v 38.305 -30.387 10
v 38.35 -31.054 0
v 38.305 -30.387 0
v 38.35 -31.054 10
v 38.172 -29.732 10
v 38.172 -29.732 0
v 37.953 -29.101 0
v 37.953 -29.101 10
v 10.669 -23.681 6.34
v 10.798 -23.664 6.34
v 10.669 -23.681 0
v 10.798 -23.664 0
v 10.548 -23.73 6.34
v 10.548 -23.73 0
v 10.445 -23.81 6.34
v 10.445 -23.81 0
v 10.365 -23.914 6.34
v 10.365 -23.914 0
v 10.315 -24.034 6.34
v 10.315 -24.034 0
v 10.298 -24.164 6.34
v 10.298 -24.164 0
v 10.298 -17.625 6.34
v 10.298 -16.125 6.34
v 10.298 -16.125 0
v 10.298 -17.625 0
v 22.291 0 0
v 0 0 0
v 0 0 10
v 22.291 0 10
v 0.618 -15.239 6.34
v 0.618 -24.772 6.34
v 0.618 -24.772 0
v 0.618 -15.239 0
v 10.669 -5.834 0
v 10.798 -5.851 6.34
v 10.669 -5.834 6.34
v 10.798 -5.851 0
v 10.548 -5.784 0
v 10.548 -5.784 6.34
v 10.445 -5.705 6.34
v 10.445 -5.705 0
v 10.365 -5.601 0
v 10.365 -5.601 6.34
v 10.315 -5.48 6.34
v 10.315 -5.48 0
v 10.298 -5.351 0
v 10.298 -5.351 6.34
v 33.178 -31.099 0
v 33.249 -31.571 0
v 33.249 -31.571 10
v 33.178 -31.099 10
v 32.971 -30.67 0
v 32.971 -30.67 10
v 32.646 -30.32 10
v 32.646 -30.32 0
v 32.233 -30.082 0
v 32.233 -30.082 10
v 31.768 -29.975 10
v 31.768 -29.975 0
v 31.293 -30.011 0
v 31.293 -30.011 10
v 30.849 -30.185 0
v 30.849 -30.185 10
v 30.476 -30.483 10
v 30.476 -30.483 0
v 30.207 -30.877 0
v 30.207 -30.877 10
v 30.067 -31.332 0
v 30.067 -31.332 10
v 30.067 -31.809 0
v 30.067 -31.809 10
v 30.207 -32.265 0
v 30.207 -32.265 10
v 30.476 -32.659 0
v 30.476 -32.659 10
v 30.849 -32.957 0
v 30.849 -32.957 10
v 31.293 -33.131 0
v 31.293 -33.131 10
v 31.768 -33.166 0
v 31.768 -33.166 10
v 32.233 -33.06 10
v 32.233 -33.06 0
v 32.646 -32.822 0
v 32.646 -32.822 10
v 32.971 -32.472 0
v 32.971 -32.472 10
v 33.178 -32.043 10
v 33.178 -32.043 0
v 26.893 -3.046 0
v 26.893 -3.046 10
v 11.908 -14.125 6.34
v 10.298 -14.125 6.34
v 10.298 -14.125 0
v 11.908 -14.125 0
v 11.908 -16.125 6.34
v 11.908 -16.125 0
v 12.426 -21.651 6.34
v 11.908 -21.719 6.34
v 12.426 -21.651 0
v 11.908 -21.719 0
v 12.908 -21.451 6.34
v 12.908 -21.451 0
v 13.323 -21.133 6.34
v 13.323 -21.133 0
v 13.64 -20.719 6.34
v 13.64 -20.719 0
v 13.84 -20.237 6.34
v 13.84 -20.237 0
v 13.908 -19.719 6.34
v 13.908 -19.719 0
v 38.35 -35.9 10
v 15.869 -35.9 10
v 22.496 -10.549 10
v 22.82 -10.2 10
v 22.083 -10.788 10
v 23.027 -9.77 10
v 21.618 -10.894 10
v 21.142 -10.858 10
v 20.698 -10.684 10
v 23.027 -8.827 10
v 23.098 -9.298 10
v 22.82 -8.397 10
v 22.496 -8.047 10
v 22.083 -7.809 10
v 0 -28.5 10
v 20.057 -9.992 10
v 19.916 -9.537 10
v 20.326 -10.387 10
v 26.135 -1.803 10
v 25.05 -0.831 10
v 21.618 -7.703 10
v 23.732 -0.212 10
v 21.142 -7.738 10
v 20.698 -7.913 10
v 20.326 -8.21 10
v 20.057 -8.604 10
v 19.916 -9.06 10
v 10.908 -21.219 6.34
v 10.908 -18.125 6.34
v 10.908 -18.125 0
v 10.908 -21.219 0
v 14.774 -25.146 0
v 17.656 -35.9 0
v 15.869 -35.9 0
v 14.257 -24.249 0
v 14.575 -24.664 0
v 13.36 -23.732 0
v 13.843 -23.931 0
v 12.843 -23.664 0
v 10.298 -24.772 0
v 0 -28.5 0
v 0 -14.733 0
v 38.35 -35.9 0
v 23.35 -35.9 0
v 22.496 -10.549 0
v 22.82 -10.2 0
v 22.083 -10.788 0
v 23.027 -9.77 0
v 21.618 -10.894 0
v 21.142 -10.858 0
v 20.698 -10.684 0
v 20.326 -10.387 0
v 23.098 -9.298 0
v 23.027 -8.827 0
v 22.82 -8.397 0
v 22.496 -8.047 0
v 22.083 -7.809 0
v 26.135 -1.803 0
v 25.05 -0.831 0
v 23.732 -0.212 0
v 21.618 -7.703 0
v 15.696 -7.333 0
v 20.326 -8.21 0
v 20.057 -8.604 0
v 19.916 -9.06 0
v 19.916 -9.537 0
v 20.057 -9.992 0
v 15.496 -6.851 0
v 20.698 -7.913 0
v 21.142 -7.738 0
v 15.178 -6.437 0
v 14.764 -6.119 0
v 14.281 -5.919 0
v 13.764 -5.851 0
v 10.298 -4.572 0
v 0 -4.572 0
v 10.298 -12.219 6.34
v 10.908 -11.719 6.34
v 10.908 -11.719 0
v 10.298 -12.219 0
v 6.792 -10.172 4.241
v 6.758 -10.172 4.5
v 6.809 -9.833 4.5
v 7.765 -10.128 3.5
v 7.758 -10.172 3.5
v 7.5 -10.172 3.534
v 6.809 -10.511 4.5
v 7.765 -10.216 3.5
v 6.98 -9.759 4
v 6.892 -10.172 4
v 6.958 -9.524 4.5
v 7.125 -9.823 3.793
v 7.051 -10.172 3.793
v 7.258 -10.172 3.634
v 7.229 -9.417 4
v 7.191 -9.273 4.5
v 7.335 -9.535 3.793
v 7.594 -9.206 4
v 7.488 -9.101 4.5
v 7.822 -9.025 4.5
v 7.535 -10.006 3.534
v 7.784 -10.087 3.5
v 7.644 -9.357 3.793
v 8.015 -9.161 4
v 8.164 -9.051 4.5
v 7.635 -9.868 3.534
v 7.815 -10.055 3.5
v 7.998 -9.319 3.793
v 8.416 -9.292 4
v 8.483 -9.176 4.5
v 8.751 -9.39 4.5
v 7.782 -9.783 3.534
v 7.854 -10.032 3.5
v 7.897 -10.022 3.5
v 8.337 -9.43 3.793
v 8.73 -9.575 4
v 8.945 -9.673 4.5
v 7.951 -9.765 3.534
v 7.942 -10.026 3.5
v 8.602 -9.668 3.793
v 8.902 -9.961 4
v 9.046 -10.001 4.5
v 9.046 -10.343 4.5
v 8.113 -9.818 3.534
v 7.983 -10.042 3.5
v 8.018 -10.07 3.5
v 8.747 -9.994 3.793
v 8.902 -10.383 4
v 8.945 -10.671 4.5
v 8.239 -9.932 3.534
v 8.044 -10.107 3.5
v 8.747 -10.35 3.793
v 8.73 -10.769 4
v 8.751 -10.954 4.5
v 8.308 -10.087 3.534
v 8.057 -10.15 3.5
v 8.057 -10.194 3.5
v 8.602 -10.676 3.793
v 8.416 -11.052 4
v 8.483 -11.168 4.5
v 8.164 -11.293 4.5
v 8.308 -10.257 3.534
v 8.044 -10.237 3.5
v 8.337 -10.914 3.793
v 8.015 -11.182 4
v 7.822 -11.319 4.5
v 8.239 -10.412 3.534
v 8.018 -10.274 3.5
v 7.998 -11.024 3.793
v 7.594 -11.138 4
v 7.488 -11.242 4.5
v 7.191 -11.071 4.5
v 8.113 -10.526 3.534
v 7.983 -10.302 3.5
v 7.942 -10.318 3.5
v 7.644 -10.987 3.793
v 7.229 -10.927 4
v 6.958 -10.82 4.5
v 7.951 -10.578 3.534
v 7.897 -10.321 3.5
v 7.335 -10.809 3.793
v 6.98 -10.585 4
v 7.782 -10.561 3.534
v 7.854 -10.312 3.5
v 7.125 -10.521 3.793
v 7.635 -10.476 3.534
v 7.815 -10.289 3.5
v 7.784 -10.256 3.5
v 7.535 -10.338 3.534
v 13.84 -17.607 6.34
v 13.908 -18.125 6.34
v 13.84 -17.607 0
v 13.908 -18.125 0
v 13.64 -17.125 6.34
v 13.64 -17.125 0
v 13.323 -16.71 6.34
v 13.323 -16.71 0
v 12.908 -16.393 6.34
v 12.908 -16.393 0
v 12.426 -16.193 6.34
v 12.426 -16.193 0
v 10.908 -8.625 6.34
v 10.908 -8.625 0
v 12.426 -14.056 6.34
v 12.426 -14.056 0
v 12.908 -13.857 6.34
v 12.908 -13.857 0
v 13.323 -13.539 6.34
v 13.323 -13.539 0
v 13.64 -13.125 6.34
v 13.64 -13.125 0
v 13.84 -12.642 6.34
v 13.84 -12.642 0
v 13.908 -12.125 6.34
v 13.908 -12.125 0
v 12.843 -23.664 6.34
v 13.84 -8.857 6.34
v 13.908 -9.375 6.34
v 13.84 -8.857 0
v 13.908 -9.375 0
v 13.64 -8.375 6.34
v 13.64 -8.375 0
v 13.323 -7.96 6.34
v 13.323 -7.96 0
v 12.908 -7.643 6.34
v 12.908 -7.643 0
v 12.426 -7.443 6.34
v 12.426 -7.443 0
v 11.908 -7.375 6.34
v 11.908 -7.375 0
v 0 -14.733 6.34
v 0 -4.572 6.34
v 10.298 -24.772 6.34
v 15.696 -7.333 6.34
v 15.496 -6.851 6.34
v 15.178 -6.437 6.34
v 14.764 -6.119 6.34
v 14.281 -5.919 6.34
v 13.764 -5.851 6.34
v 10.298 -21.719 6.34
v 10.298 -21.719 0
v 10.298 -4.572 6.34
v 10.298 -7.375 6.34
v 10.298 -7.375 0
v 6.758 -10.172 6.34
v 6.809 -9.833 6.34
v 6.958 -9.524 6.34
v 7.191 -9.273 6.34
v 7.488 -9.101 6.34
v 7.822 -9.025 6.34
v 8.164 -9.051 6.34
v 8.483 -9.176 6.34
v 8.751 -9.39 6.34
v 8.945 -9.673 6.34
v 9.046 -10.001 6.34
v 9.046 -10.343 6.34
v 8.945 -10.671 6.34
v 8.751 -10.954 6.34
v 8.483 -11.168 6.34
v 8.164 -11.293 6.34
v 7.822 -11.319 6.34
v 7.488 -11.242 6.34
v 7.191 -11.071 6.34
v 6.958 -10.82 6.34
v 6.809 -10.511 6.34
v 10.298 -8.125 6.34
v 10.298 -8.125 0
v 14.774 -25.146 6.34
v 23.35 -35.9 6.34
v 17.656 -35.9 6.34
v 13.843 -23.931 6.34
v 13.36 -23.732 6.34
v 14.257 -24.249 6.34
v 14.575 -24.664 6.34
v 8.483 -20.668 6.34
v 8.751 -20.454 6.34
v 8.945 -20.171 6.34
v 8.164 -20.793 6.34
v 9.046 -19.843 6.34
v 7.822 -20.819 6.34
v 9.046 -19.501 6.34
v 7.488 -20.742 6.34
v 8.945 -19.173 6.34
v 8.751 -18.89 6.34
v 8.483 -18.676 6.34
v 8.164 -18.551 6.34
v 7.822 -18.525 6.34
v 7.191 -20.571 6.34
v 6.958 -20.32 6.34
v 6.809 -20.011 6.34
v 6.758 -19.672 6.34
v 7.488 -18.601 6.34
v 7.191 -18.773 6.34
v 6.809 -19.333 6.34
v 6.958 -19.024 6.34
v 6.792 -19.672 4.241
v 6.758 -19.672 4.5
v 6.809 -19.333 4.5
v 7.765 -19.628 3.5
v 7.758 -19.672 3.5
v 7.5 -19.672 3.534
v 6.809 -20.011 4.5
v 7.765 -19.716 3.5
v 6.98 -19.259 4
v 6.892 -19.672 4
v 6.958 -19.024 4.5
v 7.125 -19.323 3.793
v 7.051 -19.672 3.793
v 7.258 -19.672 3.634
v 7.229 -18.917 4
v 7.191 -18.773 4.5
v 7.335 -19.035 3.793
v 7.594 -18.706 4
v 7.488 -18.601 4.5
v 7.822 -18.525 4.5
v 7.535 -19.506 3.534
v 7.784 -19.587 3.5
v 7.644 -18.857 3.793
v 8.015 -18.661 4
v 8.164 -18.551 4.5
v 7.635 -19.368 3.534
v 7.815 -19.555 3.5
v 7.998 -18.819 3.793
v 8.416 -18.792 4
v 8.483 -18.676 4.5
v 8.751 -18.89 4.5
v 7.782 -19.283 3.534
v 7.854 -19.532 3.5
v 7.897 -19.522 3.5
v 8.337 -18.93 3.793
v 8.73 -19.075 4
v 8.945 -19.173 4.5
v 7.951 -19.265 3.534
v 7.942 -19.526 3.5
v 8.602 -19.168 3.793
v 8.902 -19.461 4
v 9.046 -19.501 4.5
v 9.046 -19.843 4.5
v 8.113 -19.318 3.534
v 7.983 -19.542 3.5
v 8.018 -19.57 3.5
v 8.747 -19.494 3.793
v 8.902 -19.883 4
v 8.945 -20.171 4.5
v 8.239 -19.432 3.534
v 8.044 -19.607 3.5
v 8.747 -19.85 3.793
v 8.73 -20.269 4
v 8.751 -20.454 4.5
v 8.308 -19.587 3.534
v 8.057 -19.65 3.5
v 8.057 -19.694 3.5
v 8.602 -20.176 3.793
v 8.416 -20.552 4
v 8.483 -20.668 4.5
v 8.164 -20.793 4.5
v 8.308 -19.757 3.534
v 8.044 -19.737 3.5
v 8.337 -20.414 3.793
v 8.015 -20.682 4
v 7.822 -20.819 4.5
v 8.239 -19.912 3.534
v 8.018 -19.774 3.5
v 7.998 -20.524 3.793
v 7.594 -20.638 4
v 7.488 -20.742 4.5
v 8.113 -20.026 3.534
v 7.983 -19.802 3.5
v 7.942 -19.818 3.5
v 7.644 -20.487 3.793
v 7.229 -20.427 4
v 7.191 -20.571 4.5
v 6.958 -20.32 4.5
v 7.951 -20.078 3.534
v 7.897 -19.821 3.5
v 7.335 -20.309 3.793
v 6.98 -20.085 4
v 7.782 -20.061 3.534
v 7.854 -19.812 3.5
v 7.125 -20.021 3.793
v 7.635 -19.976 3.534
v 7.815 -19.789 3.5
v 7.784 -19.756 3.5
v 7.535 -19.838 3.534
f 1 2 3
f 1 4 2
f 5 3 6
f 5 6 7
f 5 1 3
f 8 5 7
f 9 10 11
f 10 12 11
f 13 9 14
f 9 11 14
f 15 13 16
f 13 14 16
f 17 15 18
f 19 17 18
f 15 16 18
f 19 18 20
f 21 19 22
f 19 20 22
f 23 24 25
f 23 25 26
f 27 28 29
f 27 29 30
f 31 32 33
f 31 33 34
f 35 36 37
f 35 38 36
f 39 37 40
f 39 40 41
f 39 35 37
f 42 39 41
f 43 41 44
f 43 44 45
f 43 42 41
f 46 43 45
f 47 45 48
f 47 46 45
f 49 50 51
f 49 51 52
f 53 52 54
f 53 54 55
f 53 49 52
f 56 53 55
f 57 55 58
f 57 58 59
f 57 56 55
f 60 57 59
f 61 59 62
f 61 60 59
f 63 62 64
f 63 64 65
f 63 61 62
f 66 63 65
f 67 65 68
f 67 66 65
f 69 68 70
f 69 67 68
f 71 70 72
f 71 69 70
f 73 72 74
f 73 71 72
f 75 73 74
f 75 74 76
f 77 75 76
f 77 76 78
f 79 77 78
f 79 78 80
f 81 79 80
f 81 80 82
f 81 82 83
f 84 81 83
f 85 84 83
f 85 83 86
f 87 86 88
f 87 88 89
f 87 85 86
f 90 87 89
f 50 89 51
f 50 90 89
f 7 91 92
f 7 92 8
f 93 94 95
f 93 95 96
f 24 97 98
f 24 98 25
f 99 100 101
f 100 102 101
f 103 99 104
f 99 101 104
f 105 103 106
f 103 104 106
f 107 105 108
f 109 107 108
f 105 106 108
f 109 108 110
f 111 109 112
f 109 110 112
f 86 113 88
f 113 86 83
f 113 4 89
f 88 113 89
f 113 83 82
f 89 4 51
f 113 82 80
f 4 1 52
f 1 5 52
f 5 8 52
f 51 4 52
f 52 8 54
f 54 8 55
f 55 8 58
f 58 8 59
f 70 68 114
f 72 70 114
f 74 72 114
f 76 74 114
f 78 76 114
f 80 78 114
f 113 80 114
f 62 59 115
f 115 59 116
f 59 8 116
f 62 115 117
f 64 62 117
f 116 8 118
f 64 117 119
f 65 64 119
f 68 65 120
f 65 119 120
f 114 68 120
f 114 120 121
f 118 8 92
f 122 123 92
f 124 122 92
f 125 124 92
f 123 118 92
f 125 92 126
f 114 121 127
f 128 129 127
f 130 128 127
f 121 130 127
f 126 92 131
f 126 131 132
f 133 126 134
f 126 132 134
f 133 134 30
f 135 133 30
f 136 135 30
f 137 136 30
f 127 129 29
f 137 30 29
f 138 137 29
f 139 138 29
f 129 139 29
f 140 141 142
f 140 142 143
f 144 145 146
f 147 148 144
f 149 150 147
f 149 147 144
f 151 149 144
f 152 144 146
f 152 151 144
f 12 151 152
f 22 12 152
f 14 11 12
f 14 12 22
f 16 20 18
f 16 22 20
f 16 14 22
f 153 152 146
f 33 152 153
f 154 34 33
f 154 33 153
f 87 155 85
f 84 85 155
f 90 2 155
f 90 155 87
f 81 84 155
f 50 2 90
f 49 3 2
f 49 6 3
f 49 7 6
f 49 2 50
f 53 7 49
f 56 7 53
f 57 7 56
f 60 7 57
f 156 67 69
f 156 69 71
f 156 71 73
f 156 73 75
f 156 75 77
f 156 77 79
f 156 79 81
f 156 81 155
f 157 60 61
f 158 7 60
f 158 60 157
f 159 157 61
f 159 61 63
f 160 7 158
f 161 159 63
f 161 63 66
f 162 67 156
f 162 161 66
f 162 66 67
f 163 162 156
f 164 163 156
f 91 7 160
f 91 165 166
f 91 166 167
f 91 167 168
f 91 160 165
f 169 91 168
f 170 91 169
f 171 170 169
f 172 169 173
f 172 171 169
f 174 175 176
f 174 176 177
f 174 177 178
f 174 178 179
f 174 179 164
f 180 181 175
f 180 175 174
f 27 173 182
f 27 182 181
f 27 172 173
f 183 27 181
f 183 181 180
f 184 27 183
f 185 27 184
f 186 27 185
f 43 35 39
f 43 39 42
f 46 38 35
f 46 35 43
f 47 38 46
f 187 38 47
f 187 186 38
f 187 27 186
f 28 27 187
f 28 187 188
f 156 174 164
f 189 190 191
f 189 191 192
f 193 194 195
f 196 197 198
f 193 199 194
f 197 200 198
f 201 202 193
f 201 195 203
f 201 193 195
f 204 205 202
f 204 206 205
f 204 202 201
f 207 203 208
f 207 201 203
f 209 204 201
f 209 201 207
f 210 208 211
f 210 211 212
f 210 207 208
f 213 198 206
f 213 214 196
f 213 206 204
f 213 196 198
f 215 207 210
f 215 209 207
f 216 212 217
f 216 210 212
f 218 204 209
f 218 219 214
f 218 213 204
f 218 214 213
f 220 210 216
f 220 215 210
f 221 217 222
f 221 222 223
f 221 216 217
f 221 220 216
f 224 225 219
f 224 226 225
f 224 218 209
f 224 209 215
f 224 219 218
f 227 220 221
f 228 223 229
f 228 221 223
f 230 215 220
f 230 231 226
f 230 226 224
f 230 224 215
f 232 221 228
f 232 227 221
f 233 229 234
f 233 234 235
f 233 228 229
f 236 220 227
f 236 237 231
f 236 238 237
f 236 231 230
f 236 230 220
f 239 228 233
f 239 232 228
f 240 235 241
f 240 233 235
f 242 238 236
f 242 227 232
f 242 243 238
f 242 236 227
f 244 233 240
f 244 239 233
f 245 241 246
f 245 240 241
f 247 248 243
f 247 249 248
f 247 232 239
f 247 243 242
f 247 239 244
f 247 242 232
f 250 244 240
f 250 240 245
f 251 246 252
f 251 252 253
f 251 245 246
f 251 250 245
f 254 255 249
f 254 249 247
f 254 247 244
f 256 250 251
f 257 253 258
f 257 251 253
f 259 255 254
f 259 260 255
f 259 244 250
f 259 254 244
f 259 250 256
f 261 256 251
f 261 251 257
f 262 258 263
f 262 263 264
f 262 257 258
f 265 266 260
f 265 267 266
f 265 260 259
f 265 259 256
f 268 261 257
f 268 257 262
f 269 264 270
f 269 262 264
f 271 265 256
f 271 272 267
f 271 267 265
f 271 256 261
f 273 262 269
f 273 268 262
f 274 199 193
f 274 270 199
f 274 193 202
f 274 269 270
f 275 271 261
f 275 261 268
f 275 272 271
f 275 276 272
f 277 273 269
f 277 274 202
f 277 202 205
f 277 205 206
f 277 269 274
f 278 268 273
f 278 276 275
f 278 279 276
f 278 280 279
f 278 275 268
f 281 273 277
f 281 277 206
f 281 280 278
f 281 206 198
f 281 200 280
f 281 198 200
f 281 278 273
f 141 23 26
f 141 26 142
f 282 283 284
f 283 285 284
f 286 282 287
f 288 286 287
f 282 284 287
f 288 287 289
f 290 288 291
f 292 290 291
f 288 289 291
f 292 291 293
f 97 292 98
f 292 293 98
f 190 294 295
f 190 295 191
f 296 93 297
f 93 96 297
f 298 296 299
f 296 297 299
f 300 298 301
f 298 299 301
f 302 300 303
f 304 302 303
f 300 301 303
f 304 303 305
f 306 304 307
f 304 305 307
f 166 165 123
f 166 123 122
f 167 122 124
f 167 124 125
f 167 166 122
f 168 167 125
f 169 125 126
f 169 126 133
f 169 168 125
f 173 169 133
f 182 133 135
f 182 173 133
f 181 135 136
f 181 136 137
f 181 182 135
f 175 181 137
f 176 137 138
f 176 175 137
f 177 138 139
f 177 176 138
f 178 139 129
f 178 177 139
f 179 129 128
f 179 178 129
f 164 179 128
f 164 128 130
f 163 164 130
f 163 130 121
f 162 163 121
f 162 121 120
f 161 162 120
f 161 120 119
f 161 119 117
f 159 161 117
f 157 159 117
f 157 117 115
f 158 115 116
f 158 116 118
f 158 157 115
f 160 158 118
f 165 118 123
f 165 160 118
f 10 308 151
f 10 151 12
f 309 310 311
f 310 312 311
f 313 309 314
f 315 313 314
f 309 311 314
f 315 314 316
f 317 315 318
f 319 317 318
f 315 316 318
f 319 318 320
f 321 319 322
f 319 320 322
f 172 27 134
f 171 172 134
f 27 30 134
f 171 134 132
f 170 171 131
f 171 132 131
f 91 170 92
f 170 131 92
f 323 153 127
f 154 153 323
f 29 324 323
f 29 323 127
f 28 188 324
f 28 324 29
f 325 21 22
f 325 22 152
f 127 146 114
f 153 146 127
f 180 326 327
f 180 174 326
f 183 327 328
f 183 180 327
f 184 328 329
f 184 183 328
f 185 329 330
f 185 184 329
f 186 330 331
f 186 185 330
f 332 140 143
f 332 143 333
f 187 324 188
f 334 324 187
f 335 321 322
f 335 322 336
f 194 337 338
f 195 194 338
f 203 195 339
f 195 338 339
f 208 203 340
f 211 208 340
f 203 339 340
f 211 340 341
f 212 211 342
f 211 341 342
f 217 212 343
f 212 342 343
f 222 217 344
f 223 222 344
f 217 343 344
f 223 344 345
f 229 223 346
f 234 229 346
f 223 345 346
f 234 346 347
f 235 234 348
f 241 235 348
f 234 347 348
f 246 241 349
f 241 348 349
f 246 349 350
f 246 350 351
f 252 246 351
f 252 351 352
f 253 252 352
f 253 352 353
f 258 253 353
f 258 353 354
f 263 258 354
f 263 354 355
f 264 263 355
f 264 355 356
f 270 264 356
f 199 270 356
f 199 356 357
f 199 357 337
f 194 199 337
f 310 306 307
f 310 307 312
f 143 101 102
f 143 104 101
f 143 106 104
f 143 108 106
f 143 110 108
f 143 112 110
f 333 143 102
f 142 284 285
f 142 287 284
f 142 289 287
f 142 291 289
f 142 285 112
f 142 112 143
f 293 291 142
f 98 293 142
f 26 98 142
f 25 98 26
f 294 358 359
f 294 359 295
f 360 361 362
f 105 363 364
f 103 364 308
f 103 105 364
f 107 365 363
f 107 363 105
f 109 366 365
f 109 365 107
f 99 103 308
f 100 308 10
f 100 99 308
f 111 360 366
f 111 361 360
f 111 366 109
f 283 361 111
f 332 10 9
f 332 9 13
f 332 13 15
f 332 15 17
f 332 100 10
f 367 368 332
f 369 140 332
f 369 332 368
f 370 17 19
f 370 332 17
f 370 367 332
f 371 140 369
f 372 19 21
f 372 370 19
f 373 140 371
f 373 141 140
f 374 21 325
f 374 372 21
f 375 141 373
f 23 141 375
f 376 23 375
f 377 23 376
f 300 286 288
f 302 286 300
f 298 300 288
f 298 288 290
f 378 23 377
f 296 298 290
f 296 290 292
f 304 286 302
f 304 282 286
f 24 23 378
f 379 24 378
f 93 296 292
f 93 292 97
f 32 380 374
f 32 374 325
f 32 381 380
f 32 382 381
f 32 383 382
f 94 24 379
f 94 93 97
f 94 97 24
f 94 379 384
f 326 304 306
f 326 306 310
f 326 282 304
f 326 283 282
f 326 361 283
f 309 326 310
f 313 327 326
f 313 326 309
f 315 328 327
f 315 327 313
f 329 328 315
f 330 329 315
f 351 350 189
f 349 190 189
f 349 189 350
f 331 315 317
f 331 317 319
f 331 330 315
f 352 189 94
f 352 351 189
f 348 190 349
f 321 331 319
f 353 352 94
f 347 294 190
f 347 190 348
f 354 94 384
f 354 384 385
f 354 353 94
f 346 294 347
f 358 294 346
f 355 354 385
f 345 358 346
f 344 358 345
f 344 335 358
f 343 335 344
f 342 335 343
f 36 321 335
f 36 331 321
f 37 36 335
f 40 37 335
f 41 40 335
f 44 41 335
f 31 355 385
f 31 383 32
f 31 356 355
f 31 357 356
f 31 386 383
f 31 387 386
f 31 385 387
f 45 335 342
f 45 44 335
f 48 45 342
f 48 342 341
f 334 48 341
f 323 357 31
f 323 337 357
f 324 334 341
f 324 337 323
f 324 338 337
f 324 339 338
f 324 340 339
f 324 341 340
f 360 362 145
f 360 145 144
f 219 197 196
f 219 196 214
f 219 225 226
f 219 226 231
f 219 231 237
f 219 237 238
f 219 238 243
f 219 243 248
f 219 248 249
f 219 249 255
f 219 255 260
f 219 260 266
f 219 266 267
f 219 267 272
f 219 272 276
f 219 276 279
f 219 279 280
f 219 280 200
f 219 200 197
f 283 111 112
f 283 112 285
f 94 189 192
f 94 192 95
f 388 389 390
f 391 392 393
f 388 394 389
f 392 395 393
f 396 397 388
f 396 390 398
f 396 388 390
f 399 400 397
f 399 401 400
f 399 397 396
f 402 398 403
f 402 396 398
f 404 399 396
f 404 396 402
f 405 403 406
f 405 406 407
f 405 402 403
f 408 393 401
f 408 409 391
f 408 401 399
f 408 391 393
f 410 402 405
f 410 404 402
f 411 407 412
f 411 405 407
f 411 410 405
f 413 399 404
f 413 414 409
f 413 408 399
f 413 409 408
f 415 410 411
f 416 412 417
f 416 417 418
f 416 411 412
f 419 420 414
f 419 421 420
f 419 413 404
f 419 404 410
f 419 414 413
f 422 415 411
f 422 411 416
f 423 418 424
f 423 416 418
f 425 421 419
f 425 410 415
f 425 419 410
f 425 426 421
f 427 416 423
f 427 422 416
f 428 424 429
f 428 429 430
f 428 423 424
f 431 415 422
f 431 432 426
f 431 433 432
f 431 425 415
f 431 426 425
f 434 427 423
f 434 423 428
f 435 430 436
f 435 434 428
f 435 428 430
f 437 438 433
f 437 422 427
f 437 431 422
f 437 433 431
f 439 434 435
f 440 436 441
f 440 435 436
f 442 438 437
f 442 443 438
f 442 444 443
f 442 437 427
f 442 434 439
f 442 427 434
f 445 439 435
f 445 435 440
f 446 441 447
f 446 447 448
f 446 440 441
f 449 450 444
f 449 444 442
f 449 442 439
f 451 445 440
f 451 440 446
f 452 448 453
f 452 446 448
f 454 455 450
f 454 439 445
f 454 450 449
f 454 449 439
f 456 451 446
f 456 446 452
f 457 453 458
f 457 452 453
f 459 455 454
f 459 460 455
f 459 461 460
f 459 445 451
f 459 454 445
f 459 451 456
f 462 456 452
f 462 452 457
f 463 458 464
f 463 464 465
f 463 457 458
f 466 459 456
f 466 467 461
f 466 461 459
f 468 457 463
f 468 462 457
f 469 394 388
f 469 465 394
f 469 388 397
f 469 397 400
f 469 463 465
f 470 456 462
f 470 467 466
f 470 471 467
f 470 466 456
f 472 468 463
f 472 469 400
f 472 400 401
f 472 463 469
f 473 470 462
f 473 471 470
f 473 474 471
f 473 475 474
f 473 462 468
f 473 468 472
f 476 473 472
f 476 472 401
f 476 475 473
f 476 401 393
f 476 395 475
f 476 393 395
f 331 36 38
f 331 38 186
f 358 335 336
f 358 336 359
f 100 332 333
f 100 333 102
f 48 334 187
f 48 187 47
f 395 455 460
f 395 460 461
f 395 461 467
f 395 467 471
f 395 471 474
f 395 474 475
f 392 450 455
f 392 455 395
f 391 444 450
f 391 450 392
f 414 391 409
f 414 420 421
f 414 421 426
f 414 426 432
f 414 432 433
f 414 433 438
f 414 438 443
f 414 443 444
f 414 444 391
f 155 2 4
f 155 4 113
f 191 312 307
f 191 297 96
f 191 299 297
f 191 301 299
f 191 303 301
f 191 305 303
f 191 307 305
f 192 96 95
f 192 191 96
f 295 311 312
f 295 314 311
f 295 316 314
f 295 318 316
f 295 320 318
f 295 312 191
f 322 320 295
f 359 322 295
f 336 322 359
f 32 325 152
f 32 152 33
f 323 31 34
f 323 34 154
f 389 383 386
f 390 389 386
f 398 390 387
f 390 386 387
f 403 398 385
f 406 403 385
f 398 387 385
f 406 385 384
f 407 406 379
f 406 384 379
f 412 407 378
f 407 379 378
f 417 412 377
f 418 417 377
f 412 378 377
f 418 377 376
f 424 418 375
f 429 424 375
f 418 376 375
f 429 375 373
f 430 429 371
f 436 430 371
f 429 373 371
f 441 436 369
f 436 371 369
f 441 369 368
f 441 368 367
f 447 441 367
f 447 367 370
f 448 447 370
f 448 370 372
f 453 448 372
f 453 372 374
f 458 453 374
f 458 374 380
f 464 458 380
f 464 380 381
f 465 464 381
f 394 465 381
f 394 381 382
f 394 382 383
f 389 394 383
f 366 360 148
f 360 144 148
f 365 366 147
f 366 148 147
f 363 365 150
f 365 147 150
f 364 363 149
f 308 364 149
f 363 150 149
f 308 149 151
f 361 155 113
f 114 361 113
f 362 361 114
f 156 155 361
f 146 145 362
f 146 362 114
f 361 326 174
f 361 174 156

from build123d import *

# Parameters (mm, degrees)
SKETCH1_R           = 1.6
BOSS_EXTRUDE1_DEPTH = 10
CAVITY1_OUTLINE_R   = 1.25
CAVITY1_DEPTH       = 6.34
CAVITY1_START       = -22.606898648
CAVITY1_2_OUTLINE_R = 0.9
CAVITY1_2_DEPTH     = 0.47
CAVITY1_START_2     = -15.306898648
CAVITY1_3_OUTLINE_R = 0.9
CAVITY1_3_DEPTH     = 0.47
CAVITY1_START_3     = -6.506898648
CAVITY1_4_OUTLINE_R = 0.9
CAVITY1_4_DEPTH     = 0.47
CUT_EXTRUDE2_REACH  = 54.912
SKETCH2_R           = 1.15
CUT_EXTRUDE3_START  = -3.5
SKETCH3_R           = 1.15
CUT_EXTRUDE3_DEPTH  = 3.5
FILLET1_R           = 1
FILLET2_R           = 5
CUT_EXTRUDE4_START  = -6.34
CUT_EXTRUDE4_DEPTH  = 6.34
FILLET3_R           = 2
FILLET4_R           = 2
FILLET5_R           = 0.5


with BuildPart() as part:
    # Sketch1 → Boss-Extrude1 (new body)
    with BuildSketch(Plane.XY):
        Polygon((0, 0), (25.6, 0), (38.35, -30.037117664), (38.35, -35.9), (15.869351212, -35.9), (0, -28.5), align=None)
        with Locations((31.648794461, -31.570900751)):
            Circle(SKETCH1_R, mode=Mode.SUBTRACT)
        with Locations((21.498394042, -9.298229799)):
            Circle(SKETCH1_R, mode=Mode.SUBTRACT)
    extrude(amount=BOSS_EXTRUDE1_DEPTH)

    # Cavity1: read off the stored shape, not the designer's step
    # Cavity1 outline → Cavity1 (cut)
    with BuildSketch(Plane.XY):
        Polygon((10.198394042, -24.671898648), (10.198394042, -21.671898648), (10.808394042, -21.171898648), (10.808394042, -18.171898648), (10.198394042, -17.671898648), (10.198394042, -12.171898648), (10.808394042, -11.671898648), (10.808394042, -8.671898648), (10.198394042, -8.171898648), (10.198394042, -4.671898648), (0, -4.671898648), (0, -14.603899938), (0.718394042, -15.191898648), (0.718394042, -24.671898648), align=None)
        with Locations((7.908394042, -19.671898648)):
            Circle(CAVITY1_OUTLINE_R, mode=Mode.SUBTRACT)
        with Locations((7.908394042, -10.171898648)):
            Circle(CAVITY1_OUTLINE_R, mode=Mode.SUBTRACT)
    extrude(amount=CAVITY1_DEPTH, mode=Mode.SUBTRACT)

    # Cavity1 2 outline → Cavity1 2 (cut)
    with BuildSketch(Plane(origin=(0, 0, 0), x_dir=(1, 0, 0), z_dir=(0, 1, 0)).offset(CAVITY1_START)):
        Polygon((13.478394042, -4.73), (14.198394042, -4.01), (14.198394042, -2.33), (13.478394042, -1.61), (10.198394042, -1.61), (10.198394042, -4.73), align=None)
        with Locations((12.398394042, -3.17)):
            Circle(CAVITY1_2_OUTLINE_R, mode=Mode.SUBTRACT)
    extrude(amount=CAVITY1_2_DEPTH, mode=Mode.SUBTRACT)

    # Cavity1 3 outline → Cavity1 3 (cut)
    with BuildSketch(Plane(origin=(0, 0, 0), x_dir=(1, 0, 0), z_dir=(0, 1, 0)).offset(CAVITY1_START_2)):
        Polygon((13.478394042, -4.73), (14.198394042, -4.01), (14.198394042, -2.33), (13.478394042, -1.61), (10.198394042, -1.61), (10.198394042, -4.73), align=None)
        with Locations((12.398394042, -3.17)):
            Circle(CAVITY1_3_OUTLINE_R, mode=Mode.SUBTRACT)
    extrude(amount=CAVITY1_3_DEPTH, mode=Mode.SUBTRACT)

    # Cavity1 4 outline → Cavity1 4 (cut)
    with BuildSketch(Plane(origin=(0, 0, 0), x_dir=(1, 0, 0), z_dir=(0, 1, 0)).offset(CAVITY1_START_3)):
        Polygon((13.478394042, -4.73), (14.198394042, -4.01), (14.198394042, -2.33), (13.478394042, -1.61), (10.198394042, -1.61), (10.198394042, -4.73), align=None)
        with Locations((12.398394042, -3.17)):
            Circle(CAVITY1_4_OUTLINE_R, mode=Mode.SUBTRACT)
    extrude(amount=CAVITY1_4_DEPTH, mode=Mode.SUBTRACT)

    # Cut-Extrude2: up to this face of the body (flat: up to its plane)
    cut_extrude2_end = Plane(part.part.faces().sort_by_distance((19.850612991, -19.341556746, 0))[0])
    # Sketch2 → Cut-Extrude2 (cut, up to the picked face)
    with BuildSketch(Plane(origin=(0, 0, 6.34), x_dir=(-1, 0, 0), z_dir=(0, 0, -1)), mode=Mode.PRIVATE) as cut_extrude2_sk1:
        Polygon((-10.908394042, -21.219231953), (-10.298394042, -21.719231953), (-10.298394042, -24.771898648), (-0.618394042, -24.771898648), (-0.618394042, -15.239275241), (0.1, -14.651276531), (0.1, -4.571898648), (-10.298394042, -4.571898648), (-10.298394042, -8.124565343), (-10.908394042, -8.624565343), (-10.908394042, -11.719231953), (-10.298394042, -12.219231953), (-10.298394042, -17.624565343), (-10.908394042, -18.124565343), align=None)
        with Locations((-7.908394042, -10.171898648)):
            Circle(SKETCH2_R, mode=Mode.SUBTRACT)
        with Locations((-7.908394042, -19.671898648)):
            Circle(SKETCH2_R, mode=Mode.SUBTRACT)
    cut_extrude2_tool1 = split(extrude(cut_extrude2_sk1.sketch, amount=CUT_EXTRUDE2_REACH, mode=Mode.PRIVATE), bisect_by=cut_extrude2_end, keep=Keep.BOTH, mode=Mode.PRIVATE)
    add(cut_extrude2_tool1.solids().sort_by(Axis((5.274649, -14.483088, 6.34), (0, 0, -1)))[0], mode=Mode.SUBTRACT)

    # Sketch3 → Cut-Extrude3 (cut)
    with BuildSketch(Plane(origin=(0, 0, 0), x_dir=(-1, 0, 0), z_dir=(0, 0, -1)).offset(CUT_EXTRUDE3_START)):
        with Locations((-7.908394042, -10.171898648)):
            Circle(SKETCH3_R)
        with Locations((-7.908394042, -19.671898648)):
            Circle(SKETCH3_R)
    extrude(amount=CUT_EXTRUDE3_DEPTH, mode=Mode.SUBTRACT)

    # Fillet1
    fillet1_edges = [part.edges().sort_by_distance(p)[0] for p in [
        (9.058394042, -10.171898648, 3.5),
        (9.058394042, -19.671898648, 3.5),
    ]]
    fillet(fillet1_edges, radius=FILLET1_R)

    # Fillet2
    fillet2_edges = [part.edges().sort_by_distance(p)[0] for p in [
        (25.6, 0, 5),
        (38.35, -30.037117664, 5),
    ]]
    fillet(fillet2_edges, radius=FILLET2_R)

    # Sketch4 → Cut-Extrude4 (cut)
    with BuildSketch(Plane(origin=(0, 0, 0), x_dir=(-1, 0, 0), z_dir=(0, 0, -1)).offset(CUT_EXTRUDE4_START)):
        Polygon((-10.298394042, -5.850997484), (-15.298394042, -5.850997484), (-23.35, -35.9), (-17.655981008, -35.9), (-14.377222224, -23.663505632), (-10.298394042, -23.663505632), (-10.298394042, -21.719231953), (-13.908394042, -21.719231953), (-13.908394042, -16.124565343), (-10.298394042, -16.124565343), (-10.298394042, -14.124565343), (-13.908394042, -14.124565343), (-13.908394042, -7.374565343), (-10.298394042, -7.374565343), align=None)
    extrude(amount=CUT_EXTRUDE4_DEPTH, mode=Mode.SUBTRACT)

    # Fillet3
    fillet3_edges = [part.edges().sort_by_distance(p)[0] for p in [
        (14.377222224, -23.663505632, 3.17),
        (13.908394042, -21.719231953, 3.17),
        (13.908394042, -16.124565343, 3.17),
        (13.908394042, -14.124565343, 3.17),
        (13.908394042, -7.374565343, 3.17),
    ]]
    fillet(fillet3_edges, radius=FILLET3_R)

    # Fillet4
    fillet4_edges = [part.edges().sort_by_distance(p)[0] for p in [
        (15.298394042, -5.850997484, 3.17),
    ]]
    fillet(fillet4_edges, radius=FILLET4_R)

    # Fillet5
    fillet5_edges = [part.edges().sort_by_distance(p)[0] for p in [
        (10.298394042, -5.850997484, 3.17),
        (10.298394042, -23.663505632, 3.17),
    ]]
    fillet(fillet5_edges, radius=FILLET5_R)


solid = part.part
